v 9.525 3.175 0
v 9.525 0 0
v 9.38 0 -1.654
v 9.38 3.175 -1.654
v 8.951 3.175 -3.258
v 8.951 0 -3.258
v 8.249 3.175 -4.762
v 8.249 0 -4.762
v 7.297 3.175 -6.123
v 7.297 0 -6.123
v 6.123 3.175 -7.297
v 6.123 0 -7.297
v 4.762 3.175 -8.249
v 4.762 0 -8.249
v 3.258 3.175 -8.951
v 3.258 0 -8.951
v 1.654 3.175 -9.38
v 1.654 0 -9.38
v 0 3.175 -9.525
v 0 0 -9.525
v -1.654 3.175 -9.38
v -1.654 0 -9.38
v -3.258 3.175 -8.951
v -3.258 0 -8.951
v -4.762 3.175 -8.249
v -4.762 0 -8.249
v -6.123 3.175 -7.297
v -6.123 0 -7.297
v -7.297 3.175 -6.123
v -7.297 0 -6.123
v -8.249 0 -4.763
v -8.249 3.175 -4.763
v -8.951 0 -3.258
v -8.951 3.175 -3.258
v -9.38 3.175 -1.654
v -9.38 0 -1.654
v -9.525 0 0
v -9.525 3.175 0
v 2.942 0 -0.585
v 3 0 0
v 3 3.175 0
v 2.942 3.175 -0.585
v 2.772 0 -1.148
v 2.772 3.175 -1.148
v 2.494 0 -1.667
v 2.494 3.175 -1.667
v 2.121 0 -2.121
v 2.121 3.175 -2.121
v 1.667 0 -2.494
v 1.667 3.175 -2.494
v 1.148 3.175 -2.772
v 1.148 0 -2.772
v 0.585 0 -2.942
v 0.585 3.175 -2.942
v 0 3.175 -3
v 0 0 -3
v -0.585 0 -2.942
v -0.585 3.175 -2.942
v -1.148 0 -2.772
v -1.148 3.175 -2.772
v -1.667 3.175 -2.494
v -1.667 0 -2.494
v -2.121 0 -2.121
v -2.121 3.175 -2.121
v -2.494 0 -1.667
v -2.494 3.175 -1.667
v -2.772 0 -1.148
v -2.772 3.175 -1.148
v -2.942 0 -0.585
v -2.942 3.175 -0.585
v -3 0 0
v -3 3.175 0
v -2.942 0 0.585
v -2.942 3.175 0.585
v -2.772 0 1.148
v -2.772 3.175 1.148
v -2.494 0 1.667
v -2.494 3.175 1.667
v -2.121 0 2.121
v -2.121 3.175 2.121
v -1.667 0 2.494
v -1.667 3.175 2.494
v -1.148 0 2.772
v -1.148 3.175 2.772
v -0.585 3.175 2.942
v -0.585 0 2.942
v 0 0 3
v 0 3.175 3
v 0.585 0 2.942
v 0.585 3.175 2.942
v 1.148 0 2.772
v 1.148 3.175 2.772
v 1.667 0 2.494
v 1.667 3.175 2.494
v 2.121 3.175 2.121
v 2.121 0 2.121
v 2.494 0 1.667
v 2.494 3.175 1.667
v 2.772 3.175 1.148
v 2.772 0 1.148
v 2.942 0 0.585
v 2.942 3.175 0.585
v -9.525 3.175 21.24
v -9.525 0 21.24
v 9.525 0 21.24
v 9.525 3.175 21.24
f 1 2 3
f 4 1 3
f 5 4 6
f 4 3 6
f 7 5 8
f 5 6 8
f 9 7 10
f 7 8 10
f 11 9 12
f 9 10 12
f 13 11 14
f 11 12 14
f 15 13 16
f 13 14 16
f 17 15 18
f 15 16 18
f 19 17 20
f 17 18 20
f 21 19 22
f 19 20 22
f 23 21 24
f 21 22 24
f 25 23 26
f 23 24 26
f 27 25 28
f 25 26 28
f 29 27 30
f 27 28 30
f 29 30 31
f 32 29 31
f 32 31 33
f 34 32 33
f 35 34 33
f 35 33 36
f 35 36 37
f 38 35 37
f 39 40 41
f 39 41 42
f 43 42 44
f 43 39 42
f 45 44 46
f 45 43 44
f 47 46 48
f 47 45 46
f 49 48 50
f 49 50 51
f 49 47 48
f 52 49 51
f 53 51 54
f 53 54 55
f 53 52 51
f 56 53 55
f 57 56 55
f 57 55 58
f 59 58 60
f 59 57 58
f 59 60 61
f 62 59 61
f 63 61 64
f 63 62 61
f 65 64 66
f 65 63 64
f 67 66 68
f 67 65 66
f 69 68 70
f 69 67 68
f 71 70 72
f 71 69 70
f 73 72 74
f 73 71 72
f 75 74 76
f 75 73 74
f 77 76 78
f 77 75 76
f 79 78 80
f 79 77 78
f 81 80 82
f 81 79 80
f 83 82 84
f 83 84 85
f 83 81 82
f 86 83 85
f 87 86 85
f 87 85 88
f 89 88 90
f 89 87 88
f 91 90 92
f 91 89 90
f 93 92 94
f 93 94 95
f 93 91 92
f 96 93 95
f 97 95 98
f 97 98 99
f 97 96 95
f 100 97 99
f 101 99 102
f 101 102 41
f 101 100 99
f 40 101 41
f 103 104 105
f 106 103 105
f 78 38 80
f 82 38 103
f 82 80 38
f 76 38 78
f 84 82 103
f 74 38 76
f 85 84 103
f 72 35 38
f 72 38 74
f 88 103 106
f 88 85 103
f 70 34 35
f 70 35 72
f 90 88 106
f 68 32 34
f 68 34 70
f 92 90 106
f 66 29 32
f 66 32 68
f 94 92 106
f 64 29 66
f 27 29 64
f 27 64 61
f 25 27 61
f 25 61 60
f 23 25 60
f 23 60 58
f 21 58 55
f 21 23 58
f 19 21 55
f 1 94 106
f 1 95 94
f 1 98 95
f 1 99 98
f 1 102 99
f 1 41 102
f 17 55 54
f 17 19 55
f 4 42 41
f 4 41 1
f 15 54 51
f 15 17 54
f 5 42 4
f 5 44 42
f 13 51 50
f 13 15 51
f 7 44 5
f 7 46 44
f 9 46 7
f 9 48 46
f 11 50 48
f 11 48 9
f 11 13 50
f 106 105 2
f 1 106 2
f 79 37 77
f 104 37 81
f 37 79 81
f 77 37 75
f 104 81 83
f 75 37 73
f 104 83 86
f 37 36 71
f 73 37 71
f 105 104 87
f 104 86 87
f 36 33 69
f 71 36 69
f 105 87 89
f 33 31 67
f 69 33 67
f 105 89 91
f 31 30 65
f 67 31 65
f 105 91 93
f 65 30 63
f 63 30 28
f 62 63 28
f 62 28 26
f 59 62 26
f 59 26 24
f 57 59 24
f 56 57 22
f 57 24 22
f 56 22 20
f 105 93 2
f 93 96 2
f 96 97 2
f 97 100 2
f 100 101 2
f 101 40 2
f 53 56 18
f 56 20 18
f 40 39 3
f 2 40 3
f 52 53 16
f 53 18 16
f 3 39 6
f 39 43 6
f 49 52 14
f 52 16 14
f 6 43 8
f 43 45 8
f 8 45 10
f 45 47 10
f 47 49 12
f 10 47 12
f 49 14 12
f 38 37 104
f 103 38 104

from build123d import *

# Parameters (mm, degrees)
SKETCH1_R           = 3
BOSS_EXTRUDE1_DEPTH = 3.175


with BuildPart() as part:
    # Sketch1 → Boss-Extrude1 (new body)
    with BuildSketch(Plane(origin=(0, 0, 0), x_dir=(1, 0, 0), z_dir=(0, 1, 0))):
        with BuildLine():
            Line((-9.525, 0), (-9.525, -21.24))
            Line((-9.525, -21.24), (9.525, -21.24))
            Line((9.525, -21.24), (9.525, 0))
            ThreePointArc((9.525, 0), (0, 9.525), (-9.525, 0))
        make_face()
        Circle(SKETCH1_R, mode=Mode.SUBTRACT)
    extrude(amount=BOSS_EXTRUDE1_DEPTH)


solid = part.part
